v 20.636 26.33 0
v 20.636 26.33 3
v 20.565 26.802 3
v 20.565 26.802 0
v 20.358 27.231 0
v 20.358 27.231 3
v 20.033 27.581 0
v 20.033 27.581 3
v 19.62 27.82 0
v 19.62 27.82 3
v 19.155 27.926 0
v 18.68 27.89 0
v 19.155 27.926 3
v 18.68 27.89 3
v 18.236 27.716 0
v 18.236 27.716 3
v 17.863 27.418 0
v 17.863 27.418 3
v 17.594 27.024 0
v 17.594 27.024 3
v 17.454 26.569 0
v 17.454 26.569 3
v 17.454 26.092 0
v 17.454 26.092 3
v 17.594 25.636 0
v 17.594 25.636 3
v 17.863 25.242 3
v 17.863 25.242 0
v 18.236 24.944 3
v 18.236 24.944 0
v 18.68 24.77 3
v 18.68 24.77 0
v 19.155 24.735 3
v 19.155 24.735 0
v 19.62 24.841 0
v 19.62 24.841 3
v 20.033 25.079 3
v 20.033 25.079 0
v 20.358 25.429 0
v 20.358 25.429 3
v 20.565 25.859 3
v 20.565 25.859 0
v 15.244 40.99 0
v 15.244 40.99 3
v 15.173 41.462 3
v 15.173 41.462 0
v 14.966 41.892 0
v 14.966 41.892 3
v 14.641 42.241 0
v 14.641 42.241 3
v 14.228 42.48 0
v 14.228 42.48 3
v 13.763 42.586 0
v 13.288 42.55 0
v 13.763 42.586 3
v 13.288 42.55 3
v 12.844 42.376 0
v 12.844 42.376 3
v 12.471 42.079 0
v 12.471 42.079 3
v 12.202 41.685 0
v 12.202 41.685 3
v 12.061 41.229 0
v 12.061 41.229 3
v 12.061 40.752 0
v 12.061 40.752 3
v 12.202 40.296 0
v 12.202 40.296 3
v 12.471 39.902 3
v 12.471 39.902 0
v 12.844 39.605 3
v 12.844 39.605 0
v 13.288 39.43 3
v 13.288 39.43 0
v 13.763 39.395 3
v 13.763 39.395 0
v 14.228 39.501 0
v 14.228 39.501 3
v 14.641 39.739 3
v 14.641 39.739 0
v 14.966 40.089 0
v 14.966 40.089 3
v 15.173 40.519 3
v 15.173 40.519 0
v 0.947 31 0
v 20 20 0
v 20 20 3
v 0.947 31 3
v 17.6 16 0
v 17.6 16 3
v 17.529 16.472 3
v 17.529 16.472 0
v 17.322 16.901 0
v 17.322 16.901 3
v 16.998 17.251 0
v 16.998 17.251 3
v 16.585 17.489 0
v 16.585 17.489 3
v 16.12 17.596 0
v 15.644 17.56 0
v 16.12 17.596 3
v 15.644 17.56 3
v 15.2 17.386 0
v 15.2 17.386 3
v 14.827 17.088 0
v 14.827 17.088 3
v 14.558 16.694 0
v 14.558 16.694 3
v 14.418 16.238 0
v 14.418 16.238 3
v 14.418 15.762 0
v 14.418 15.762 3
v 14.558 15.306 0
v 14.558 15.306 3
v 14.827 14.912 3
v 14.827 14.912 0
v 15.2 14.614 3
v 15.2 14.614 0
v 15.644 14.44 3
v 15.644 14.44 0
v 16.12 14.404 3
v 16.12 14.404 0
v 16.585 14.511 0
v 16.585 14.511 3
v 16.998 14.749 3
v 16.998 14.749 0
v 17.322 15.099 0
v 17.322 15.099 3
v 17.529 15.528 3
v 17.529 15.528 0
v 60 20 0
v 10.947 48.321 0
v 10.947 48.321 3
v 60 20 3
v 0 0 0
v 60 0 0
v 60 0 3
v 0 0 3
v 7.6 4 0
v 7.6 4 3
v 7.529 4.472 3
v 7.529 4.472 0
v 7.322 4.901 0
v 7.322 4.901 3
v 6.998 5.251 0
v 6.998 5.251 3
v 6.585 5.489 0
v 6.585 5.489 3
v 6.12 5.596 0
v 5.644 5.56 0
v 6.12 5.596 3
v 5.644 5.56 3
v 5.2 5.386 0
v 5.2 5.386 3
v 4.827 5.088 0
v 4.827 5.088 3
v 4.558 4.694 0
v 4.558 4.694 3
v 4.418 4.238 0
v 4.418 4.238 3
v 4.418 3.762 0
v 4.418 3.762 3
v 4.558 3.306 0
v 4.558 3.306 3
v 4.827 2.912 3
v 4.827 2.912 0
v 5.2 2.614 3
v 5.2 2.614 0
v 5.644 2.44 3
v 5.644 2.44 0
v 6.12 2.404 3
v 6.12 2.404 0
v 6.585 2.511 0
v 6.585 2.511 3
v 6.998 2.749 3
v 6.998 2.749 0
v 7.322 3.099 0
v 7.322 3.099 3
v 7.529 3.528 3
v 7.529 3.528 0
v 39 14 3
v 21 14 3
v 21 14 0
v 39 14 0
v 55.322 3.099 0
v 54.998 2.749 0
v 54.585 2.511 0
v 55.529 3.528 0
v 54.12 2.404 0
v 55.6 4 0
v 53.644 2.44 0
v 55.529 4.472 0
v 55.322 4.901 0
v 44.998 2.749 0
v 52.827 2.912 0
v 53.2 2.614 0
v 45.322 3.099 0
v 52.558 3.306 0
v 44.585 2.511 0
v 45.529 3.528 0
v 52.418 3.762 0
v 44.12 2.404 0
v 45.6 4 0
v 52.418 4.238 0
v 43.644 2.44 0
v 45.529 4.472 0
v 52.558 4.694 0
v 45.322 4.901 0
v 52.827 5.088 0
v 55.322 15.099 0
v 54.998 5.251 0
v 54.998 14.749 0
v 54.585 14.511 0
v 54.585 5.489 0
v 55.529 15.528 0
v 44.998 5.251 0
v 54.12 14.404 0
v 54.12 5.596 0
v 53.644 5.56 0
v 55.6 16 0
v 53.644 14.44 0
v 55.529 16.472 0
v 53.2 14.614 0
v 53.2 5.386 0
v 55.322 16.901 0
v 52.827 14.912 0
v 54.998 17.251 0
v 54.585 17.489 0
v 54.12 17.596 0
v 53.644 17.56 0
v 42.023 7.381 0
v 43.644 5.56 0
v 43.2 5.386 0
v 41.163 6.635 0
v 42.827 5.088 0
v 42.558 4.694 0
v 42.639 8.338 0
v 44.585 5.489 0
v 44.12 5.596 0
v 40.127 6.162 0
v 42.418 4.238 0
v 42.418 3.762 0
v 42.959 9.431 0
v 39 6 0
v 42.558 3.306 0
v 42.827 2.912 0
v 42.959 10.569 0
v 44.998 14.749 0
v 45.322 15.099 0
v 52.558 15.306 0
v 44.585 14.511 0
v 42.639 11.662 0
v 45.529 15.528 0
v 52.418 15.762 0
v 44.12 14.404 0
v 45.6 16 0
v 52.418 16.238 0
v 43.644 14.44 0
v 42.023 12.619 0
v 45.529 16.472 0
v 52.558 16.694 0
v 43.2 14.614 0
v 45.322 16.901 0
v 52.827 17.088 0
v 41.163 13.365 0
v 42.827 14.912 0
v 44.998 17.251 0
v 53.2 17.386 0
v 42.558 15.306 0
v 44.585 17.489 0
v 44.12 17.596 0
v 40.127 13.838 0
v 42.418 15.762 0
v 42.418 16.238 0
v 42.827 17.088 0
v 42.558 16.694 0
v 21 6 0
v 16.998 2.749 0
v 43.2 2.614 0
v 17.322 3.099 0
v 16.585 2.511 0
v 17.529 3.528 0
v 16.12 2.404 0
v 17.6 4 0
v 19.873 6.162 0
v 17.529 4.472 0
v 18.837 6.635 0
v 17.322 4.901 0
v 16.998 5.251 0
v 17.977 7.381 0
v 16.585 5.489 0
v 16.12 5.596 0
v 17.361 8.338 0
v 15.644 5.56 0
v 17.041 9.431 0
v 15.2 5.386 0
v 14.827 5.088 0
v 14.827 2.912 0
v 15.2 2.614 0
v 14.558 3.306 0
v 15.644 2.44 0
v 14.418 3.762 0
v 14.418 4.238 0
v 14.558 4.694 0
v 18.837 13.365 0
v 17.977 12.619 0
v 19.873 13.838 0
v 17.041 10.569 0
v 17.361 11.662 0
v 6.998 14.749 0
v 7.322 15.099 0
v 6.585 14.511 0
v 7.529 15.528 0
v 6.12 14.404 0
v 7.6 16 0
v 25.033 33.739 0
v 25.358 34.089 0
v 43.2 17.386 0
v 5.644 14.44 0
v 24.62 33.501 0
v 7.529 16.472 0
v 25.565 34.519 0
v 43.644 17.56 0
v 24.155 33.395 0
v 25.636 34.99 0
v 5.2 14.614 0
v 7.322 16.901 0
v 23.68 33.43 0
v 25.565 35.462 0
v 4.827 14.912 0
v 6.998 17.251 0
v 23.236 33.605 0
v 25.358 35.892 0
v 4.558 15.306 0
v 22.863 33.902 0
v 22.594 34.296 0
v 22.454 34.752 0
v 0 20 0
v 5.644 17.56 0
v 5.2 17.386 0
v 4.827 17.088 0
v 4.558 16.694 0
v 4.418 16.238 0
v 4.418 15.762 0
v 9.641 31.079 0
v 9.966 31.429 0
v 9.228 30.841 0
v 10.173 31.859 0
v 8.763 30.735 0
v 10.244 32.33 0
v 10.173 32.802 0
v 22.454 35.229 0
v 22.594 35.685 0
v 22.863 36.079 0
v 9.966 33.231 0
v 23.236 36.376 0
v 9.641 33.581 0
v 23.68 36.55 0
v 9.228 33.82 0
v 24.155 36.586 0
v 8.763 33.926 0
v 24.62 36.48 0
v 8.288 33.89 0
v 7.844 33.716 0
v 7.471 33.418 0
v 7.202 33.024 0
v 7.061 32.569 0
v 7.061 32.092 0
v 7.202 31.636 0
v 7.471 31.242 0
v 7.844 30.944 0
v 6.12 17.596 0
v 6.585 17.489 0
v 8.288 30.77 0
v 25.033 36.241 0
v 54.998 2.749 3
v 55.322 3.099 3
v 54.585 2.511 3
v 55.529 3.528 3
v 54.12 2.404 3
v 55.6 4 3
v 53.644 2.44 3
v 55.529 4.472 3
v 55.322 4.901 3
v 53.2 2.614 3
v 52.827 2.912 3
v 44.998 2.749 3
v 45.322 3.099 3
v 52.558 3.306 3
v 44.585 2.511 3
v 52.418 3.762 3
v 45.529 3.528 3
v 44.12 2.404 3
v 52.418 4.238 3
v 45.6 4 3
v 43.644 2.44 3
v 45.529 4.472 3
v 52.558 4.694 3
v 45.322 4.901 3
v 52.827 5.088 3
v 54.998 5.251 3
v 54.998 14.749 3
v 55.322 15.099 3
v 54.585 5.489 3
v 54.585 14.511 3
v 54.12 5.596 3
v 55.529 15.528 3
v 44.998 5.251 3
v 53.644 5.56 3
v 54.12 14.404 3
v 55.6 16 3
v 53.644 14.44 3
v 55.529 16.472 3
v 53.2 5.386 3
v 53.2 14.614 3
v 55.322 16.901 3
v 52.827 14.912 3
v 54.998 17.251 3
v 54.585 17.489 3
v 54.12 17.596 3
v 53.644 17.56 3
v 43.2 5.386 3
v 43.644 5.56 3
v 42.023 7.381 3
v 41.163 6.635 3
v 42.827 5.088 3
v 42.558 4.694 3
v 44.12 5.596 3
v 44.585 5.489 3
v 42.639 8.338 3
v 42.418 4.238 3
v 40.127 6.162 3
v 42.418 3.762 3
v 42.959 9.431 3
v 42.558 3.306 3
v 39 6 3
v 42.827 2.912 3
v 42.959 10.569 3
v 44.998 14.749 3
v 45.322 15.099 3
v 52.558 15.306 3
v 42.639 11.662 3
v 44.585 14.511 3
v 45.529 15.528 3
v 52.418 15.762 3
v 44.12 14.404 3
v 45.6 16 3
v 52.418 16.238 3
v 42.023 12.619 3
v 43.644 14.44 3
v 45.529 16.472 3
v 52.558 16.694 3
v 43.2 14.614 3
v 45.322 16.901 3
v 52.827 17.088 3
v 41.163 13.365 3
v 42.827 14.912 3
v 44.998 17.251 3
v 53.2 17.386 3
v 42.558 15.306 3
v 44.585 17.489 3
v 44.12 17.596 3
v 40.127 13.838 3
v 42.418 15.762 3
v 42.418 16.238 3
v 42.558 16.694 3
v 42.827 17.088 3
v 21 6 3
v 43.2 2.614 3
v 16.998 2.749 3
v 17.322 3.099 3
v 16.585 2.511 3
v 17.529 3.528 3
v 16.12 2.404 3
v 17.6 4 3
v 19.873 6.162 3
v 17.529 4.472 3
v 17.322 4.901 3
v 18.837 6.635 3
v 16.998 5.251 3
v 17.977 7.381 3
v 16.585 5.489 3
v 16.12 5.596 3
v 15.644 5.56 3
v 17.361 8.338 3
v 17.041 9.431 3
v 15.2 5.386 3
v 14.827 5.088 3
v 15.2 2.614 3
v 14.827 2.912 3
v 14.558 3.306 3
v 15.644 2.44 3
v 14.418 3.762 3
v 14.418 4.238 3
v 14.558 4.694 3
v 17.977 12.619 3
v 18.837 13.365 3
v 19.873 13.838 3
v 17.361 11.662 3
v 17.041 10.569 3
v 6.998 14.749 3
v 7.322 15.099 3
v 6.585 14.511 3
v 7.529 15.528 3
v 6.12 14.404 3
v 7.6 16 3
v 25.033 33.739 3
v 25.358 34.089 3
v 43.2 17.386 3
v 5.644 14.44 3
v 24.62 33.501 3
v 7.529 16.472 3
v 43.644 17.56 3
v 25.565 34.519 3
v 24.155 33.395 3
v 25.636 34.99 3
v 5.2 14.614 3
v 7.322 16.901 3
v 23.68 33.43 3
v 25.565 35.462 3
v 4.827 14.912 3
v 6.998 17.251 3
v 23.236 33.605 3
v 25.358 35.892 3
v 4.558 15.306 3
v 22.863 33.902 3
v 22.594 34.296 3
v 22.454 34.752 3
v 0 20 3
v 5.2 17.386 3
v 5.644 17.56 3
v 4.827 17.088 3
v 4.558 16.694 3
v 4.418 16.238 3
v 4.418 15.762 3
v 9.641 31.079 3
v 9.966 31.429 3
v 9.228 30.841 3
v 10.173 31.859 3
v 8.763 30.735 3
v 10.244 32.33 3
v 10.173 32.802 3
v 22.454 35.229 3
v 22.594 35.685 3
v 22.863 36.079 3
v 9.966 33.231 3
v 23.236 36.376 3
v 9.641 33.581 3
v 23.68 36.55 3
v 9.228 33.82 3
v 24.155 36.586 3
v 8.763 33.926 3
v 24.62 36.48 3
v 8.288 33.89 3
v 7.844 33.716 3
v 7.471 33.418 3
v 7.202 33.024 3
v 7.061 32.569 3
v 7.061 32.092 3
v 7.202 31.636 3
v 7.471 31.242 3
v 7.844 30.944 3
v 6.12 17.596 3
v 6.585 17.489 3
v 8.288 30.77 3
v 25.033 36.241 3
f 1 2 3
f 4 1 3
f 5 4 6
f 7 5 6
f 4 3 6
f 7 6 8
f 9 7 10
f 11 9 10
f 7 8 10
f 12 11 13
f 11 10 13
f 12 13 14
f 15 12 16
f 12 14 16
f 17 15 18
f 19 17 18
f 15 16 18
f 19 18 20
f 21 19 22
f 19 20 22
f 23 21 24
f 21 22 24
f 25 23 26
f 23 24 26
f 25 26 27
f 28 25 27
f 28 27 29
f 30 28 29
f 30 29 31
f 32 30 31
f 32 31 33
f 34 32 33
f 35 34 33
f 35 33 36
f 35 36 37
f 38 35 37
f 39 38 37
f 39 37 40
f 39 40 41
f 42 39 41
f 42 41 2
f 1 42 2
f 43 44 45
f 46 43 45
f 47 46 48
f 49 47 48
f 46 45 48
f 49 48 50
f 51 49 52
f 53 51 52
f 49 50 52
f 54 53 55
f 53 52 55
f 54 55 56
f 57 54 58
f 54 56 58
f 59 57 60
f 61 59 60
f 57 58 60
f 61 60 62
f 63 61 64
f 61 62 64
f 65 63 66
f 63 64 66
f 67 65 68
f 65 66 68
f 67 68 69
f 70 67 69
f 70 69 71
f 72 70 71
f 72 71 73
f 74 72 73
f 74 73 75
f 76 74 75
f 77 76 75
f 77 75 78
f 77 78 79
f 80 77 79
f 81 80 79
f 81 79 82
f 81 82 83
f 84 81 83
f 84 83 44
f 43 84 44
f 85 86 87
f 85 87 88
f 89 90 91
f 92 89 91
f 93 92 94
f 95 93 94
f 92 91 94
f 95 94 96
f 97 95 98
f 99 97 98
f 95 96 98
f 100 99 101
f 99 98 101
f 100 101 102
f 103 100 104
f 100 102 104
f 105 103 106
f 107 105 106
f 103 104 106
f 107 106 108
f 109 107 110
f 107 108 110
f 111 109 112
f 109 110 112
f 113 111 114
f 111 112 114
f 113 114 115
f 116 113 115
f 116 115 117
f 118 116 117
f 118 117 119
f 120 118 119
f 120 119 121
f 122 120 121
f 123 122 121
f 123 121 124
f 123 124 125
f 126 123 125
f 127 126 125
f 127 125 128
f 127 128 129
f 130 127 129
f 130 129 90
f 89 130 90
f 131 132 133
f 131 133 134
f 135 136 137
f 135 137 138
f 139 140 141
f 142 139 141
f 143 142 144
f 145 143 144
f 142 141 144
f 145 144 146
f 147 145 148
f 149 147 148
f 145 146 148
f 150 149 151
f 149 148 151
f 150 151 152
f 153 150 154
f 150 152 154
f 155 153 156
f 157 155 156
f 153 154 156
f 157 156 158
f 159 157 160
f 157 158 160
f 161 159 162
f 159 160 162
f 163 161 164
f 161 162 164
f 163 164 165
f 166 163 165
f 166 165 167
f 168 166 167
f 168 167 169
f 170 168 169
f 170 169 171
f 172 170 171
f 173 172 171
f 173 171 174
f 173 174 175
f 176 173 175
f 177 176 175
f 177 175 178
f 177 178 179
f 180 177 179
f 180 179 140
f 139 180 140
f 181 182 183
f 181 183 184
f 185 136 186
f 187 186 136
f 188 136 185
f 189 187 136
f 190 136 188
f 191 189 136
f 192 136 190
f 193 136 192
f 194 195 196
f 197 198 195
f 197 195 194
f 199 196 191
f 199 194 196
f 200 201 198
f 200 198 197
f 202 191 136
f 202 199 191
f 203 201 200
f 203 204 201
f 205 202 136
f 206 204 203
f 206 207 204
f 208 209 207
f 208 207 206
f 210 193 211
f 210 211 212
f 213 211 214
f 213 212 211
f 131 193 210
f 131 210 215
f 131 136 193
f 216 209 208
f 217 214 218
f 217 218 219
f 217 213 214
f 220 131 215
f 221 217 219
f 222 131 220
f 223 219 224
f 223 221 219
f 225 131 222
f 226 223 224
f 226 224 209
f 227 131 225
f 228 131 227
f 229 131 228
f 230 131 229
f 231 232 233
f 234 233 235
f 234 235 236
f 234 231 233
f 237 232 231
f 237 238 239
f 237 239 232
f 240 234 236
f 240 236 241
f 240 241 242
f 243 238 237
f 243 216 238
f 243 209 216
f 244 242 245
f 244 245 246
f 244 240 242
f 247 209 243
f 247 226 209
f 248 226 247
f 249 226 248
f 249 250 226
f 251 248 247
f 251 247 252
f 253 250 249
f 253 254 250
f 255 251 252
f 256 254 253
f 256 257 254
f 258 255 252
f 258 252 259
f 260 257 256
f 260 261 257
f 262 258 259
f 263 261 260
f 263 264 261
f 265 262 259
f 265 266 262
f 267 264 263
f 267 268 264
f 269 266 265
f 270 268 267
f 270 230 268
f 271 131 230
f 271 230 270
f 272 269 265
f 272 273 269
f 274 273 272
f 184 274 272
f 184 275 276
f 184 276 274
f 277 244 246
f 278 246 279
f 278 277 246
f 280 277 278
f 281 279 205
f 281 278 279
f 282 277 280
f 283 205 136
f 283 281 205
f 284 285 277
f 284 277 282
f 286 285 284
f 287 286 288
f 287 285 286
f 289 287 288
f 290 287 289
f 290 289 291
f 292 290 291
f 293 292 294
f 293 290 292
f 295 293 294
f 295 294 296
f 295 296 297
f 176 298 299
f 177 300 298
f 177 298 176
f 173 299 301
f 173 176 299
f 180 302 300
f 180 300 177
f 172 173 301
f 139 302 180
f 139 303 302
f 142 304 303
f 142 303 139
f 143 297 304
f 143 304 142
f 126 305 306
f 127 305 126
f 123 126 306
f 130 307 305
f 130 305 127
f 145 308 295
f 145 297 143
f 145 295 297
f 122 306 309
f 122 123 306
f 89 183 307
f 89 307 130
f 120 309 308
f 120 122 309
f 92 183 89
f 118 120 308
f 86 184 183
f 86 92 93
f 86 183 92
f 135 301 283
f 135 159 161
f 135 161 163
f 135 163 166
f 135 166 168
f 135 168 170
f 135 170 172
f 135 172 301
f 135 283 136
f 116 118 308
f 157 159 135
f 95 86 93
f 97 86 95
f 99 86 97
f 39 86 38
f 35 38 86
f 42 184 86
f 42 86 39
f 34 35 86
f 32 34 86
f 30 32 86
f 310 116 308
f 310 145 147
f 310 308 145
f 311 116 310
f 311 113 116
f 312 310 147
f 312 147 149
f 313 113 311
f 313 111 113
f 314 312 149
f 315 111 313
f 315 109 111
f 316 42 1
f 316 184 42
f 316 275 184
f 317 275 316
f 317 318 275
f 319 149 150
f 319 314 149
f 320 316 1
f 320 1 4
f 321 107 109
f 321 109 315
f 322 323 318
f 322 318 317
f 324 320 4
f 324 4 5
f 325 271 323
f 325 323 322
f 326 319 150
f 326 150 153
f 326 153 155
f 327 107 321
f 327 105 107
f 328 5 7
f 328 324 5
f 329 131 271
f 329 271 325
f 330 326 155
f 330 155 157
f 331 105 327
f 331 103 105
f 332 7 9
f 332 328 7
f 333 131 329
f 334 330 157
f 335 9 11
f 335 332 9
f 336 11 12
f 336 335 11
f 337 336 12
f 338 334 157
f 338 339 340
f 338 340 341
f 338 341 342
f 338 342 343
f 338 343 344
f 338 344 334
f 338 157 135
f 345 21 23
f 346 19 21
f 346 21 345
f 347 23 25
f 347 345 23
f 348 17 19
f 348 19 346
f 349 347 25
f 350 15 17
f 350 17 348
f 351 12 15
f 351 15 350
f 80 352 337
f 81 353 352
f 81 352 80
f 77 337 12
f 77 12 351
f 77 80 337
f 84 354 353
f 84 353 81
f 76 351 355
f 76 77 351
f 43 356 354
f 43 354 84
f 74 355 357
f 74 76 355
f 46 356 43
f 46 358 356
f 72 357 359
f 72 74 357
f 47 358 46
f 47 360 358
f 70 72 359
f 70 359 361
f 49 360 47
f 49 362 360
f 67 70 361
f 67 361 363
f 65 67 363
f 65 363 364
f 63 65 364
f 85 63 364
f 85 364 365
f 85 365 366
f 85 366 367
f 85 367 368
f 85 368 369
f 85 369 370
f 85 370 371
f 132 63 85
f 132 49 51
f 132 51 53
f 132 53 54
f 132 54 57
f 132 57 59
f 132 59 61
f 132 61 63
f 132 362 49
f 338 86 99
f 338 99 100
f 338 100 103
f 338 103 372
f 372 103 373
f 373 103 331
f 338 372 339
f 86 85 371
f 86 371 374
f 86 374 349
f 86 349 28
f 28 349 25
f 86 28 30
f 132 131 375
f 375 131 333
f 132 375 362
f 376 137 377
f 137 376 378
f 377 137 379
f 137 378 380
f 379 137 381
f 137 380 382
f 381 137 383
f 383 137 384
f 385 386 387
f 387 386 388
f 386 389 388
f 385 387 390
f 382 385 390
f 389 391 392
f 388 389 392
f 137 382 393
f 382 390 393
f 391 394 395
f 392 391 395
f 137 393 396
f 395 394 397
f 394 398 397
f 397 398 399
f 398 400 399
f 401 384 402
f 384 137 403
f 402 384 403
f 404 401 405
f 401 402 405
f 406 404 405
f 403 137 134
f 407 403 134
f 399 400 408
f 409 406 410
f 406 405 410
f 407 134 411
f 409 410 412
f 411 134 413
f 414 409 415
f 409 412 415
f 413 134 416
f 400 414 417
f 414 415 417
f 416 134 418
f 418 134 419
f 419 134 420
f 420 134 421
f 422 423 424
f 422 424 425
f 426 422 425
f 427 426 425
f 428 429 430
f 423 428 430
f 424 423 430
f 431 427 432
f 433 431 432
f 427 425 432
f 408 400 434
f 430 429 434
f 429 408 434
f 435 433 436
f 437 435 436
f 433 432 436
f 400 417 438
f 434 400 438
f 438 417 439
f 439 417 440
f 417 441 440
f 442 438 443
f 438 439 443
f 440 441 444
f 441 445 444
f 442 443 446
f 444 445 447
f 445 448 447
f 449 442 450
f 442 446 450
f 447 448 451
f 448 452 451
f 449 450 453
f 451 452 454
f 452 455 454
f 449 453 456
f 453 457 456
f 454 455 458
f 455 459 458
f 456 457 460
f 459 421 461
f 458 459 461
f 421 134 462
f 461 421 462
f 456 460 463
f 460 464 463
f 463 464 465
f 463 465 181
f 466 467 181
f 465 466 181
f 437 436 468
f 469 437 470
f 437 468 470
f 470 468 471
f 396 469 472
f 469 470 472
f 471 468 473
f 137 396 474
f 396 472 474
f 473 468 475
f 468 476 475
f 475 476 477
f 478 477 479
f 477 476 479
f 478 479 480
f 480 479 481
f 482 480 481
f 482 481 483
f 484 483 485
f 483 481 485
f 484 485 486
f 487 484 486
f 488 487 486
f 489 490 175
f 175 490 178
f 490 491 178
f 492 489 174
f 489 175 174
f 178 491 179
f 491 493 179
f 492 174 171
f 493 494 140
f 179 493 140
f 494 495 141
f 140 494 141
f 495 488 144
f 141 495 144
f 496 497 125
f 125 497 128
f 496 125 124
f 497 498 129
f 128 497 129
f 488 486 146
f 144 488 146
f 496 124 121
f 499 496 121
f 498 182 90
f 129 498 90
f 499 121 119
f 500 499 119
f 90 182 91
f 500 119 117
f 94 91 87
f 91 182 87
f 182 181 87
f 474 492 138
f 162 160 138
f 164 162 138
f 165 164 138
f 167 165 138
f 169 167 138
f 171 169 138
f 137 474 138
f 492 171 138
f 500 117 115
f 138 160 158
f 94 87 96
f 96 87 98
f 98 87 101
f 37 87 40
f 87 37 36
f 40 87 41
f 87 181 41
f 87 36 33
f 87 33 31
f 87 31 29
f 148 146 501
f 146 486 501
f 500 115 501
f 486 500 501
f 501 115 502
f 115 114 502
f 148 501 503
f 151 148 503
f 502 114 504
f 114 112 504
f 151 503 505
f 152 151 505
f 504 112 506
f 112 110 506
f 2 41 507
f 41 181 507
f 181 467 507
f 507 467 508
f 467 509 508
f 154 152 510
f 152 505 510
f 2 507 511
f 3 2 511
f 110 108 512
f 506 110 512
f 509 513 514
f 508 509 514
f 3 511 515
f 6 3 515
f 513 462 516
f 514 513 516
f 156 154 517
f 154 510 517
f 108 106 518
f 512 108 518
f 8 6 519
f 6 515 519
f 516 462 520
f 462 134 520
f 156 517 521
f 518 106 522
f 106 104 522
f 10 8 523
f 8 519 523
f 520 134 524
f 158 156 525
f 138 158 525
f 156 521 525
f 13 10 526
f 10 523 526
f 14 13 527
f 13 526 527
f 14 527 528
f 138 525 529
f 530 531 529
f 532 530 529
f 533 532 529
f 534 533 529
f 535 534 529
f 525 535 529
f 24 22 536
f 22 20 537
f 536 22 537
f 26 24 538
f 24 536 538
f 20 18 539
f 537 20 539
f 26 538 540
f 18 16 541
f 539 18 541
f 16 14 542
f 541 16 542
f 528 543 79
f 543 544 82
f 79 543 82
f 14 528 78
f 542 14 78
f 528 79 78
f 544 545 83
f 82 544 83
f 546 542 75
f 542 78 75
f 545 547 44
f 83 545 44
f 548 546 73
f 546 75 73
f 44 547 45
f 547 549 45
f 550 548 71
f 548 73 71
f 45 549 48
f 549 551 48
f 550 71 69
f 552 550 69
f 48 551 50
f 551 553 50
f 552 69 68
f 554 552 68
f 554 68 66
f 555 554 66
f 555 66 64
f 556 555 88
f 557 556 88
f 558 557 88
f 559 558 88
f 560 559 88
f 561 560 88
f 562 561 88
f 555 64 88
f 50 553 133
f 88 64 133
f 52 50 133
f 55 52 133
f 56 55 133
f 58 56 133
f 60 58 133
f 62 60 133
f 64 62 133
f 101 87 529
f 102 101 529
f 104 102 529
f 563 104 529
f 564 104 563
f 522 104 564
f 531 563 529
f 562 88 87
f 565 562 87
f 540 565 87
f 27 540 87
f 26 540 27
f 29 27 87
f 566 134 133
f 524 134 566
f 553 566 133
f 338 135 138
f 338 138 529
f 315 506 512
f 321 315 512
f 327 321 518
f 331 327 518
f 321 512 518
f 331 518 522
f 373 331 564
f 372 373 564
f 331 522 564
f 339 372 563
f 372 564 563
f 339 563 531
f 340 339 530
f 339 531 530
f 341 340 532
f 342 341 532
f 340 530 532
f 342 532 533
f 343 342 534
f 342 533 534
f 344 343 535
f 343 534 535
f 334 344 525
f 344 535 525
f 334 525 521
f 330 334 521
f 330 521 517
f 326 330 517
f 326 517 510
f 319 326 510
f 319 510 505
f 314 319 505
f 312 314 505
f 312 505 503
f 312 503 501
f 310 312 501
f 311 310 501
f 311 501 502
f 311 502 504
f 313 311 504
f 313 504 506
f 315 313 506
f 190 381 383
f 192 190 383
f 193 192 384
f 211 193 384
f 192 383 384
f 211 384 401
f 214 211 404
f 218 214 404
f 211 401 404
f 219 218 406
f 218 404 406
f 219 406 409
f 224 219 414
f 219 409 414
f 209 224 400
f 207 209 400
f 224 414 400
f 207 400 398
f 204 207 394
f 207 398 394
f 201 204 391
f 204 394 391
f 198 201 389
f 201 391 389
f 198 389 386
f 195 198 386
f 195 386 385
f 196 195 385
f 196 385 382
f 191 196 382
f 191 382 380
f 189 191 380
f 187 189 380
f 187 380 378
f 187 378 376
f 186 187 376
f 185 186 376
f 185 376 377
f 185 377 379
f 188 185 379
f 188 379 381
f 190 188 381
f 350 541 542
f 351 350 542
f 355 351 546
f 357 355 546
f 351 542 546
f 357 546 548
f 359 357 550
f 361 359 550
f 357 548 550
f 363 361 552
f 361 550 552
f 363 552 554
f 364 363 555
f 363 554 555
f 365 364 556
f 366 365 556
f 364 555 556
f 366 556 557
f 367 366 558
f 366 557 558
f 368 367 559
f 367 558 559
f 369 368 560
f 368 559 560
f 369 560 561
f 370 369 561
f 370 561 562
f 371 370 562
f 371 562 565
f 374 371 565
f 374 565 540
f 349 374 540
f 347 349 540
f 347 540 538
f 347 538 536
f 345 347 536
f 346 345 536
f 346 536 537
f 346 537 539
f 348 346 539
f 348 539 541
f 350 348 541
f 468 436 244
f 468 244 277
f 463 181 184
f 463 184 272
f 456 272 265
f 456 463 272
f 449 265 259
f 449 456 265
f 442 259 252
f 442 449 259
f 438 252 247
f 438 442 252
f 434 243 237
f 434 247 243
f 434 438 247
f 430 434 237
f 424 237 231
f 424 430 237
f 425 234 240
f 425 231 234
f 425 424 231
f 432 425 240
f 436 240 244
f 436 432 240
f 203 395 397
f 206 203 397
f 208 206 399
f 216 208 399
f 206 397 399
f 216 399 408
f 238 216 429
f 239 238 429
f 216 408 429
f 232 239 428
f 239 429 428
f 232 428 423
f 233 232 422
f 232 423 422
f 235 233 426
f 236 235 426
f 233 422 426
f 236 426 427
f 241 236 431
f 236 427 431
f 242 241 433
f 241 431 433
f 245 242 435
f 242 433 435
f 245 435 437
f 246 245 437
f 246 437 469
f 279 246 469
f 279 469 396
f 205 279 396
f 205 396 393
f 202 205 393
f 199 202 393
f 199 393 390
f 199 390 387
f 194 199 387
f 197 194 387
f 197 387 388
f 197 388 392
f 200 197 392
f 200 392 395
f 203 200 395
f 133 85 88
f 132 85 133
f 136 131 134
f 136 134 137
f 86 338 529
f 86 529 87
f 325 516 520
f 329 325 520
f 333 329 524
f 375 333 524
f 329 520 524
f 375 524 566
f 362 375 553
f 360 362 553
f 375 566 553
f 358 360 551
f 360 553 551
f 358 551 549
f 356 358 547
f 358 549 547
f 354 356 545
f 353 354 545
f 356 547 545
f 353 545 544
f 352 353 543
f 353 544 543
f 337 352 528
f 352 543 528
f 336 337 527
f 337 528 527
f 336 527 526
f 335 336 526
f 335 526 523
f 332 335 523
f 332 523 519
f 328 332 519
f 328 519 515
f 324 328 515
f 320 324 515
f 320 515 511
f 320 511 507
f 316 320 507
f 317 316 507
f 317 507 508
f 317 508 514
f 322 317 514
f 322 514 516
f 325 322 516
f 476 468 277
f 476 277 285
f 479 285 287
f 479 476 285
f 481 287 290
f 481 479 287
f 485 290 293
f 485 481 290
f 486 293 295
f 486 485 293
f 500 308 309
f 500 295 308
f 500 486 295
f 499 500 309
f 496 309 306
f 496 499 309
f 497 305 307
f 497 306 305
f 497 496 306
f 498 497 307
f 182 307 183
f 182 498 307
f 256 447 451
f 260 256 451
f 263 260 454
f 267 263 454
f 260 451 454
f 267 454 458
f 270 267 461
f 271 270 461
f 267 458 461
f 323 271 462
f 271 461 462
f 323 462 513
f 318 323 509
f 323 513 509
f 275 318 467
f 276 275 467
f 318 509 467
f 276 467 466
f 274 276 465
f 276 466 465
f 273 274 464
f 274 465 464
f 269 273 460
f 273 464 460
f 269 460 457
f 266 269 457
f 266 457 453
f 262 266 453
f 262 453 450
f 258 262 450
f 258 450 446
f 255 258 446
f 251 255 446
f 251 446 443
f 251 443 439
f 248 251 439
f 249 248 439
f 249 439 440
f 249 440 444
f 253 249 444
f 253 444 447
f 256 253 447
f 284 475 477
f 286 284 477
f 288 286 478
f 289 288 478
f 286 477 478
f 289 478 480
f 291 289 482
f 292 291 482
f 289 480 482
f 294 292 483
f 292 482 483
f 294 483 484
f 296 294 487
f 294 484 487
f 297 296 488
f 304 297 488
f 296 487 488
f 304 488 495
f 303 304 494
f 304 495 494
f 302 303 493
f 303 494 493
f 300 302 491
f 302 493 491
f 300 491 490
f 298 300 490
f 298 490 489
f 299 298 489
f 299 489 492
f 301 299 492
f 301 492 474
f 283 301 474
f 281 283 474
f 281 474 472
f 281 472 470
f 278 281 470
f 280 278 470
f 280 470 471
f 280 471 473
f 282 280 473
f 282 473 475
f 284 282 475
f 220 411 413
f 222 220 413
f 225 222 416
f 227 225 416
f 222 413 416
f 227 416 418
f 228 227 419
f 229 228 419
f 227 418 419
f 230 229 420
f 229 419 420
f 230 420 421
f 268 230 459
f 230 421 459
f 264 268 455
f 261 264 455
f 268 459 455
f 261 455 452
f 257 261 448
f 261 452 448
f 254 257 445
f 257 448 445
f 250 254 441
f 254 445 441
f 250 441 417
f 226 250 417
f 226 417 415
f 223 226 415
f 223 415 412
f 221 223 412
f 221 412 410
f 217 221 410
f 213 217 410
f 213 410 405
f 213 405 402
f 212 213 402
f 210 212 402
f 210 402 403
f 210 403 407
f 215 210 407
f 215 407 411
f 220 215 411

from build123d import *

# Parameters (mm, degrees)
EXTRUDE_1_DEPTH     = 3
SKETCH_2_R          = 1.6
CUT_EXTRUDE_1_DEPTH = 10


with BuildPart() as part:
    # 草图1 → 凸台-拉伸1 (new body)
    with BuildSketch(Plane.XY):
        Polygon((60, 0), (0, 0), (0, 20), (20, 20), (0.947441117, 31), (10.947441117, 48.320508076), (60, 20), align=None)
    extrude(amount=EXTRUDE_1_DEPTH)

    # 草图2 → 切除-拉伸1 (cut)
    with BuildSketch(Plane.XY.offset(3)):
        with Locations((13.643593539, 40.990381057)):
            Circle(SKETCH_2_R)
        with Locations((8.643593539, 32.330127019)):
            Circle(SKETCH_2_R)
        with Locations((24.035898385, 34.990381057)):
            Circle(SKETCH_2_R)
        with Locations((19.035898385, 26.330127019)):
            Circle(SKETCH_2_R)
        with Locations((6, 16)):
            Circle(SKETCH_2_R)
        with Locations((6, 4)):
            Circle(SKETCH_2_R)
        with Locations((54, 16)):
            Circle(SKETCH_2_R)
        with Locations((54, 4)):
            Circle(SKETCH_2_R)
        with Locations((16, 16)):
            Circle(SKETCH_2_R)
        with Locations((16, 4)):
            Circle(SKETCH_2_R)
        with Locations((44, 16)):
            Circle(SKETCH_2_R)
        with Locations((44, 4)):
            Circle(SKETCH_2_R)
        with BuildLine():
            Line((21, 14), (39, 14))
            ThreePointArc((39, 14), (43, 10), (39, 6))
            Line((39, 6), (21, 6))
            ThreePointArc((21, 6), (17, 10), (21, 14))
        make_face()
    extrude(amount=-CUT_EXTRUDE_1_DEPTH, mode=Mode.SUBTRACT)


solid = part.part
